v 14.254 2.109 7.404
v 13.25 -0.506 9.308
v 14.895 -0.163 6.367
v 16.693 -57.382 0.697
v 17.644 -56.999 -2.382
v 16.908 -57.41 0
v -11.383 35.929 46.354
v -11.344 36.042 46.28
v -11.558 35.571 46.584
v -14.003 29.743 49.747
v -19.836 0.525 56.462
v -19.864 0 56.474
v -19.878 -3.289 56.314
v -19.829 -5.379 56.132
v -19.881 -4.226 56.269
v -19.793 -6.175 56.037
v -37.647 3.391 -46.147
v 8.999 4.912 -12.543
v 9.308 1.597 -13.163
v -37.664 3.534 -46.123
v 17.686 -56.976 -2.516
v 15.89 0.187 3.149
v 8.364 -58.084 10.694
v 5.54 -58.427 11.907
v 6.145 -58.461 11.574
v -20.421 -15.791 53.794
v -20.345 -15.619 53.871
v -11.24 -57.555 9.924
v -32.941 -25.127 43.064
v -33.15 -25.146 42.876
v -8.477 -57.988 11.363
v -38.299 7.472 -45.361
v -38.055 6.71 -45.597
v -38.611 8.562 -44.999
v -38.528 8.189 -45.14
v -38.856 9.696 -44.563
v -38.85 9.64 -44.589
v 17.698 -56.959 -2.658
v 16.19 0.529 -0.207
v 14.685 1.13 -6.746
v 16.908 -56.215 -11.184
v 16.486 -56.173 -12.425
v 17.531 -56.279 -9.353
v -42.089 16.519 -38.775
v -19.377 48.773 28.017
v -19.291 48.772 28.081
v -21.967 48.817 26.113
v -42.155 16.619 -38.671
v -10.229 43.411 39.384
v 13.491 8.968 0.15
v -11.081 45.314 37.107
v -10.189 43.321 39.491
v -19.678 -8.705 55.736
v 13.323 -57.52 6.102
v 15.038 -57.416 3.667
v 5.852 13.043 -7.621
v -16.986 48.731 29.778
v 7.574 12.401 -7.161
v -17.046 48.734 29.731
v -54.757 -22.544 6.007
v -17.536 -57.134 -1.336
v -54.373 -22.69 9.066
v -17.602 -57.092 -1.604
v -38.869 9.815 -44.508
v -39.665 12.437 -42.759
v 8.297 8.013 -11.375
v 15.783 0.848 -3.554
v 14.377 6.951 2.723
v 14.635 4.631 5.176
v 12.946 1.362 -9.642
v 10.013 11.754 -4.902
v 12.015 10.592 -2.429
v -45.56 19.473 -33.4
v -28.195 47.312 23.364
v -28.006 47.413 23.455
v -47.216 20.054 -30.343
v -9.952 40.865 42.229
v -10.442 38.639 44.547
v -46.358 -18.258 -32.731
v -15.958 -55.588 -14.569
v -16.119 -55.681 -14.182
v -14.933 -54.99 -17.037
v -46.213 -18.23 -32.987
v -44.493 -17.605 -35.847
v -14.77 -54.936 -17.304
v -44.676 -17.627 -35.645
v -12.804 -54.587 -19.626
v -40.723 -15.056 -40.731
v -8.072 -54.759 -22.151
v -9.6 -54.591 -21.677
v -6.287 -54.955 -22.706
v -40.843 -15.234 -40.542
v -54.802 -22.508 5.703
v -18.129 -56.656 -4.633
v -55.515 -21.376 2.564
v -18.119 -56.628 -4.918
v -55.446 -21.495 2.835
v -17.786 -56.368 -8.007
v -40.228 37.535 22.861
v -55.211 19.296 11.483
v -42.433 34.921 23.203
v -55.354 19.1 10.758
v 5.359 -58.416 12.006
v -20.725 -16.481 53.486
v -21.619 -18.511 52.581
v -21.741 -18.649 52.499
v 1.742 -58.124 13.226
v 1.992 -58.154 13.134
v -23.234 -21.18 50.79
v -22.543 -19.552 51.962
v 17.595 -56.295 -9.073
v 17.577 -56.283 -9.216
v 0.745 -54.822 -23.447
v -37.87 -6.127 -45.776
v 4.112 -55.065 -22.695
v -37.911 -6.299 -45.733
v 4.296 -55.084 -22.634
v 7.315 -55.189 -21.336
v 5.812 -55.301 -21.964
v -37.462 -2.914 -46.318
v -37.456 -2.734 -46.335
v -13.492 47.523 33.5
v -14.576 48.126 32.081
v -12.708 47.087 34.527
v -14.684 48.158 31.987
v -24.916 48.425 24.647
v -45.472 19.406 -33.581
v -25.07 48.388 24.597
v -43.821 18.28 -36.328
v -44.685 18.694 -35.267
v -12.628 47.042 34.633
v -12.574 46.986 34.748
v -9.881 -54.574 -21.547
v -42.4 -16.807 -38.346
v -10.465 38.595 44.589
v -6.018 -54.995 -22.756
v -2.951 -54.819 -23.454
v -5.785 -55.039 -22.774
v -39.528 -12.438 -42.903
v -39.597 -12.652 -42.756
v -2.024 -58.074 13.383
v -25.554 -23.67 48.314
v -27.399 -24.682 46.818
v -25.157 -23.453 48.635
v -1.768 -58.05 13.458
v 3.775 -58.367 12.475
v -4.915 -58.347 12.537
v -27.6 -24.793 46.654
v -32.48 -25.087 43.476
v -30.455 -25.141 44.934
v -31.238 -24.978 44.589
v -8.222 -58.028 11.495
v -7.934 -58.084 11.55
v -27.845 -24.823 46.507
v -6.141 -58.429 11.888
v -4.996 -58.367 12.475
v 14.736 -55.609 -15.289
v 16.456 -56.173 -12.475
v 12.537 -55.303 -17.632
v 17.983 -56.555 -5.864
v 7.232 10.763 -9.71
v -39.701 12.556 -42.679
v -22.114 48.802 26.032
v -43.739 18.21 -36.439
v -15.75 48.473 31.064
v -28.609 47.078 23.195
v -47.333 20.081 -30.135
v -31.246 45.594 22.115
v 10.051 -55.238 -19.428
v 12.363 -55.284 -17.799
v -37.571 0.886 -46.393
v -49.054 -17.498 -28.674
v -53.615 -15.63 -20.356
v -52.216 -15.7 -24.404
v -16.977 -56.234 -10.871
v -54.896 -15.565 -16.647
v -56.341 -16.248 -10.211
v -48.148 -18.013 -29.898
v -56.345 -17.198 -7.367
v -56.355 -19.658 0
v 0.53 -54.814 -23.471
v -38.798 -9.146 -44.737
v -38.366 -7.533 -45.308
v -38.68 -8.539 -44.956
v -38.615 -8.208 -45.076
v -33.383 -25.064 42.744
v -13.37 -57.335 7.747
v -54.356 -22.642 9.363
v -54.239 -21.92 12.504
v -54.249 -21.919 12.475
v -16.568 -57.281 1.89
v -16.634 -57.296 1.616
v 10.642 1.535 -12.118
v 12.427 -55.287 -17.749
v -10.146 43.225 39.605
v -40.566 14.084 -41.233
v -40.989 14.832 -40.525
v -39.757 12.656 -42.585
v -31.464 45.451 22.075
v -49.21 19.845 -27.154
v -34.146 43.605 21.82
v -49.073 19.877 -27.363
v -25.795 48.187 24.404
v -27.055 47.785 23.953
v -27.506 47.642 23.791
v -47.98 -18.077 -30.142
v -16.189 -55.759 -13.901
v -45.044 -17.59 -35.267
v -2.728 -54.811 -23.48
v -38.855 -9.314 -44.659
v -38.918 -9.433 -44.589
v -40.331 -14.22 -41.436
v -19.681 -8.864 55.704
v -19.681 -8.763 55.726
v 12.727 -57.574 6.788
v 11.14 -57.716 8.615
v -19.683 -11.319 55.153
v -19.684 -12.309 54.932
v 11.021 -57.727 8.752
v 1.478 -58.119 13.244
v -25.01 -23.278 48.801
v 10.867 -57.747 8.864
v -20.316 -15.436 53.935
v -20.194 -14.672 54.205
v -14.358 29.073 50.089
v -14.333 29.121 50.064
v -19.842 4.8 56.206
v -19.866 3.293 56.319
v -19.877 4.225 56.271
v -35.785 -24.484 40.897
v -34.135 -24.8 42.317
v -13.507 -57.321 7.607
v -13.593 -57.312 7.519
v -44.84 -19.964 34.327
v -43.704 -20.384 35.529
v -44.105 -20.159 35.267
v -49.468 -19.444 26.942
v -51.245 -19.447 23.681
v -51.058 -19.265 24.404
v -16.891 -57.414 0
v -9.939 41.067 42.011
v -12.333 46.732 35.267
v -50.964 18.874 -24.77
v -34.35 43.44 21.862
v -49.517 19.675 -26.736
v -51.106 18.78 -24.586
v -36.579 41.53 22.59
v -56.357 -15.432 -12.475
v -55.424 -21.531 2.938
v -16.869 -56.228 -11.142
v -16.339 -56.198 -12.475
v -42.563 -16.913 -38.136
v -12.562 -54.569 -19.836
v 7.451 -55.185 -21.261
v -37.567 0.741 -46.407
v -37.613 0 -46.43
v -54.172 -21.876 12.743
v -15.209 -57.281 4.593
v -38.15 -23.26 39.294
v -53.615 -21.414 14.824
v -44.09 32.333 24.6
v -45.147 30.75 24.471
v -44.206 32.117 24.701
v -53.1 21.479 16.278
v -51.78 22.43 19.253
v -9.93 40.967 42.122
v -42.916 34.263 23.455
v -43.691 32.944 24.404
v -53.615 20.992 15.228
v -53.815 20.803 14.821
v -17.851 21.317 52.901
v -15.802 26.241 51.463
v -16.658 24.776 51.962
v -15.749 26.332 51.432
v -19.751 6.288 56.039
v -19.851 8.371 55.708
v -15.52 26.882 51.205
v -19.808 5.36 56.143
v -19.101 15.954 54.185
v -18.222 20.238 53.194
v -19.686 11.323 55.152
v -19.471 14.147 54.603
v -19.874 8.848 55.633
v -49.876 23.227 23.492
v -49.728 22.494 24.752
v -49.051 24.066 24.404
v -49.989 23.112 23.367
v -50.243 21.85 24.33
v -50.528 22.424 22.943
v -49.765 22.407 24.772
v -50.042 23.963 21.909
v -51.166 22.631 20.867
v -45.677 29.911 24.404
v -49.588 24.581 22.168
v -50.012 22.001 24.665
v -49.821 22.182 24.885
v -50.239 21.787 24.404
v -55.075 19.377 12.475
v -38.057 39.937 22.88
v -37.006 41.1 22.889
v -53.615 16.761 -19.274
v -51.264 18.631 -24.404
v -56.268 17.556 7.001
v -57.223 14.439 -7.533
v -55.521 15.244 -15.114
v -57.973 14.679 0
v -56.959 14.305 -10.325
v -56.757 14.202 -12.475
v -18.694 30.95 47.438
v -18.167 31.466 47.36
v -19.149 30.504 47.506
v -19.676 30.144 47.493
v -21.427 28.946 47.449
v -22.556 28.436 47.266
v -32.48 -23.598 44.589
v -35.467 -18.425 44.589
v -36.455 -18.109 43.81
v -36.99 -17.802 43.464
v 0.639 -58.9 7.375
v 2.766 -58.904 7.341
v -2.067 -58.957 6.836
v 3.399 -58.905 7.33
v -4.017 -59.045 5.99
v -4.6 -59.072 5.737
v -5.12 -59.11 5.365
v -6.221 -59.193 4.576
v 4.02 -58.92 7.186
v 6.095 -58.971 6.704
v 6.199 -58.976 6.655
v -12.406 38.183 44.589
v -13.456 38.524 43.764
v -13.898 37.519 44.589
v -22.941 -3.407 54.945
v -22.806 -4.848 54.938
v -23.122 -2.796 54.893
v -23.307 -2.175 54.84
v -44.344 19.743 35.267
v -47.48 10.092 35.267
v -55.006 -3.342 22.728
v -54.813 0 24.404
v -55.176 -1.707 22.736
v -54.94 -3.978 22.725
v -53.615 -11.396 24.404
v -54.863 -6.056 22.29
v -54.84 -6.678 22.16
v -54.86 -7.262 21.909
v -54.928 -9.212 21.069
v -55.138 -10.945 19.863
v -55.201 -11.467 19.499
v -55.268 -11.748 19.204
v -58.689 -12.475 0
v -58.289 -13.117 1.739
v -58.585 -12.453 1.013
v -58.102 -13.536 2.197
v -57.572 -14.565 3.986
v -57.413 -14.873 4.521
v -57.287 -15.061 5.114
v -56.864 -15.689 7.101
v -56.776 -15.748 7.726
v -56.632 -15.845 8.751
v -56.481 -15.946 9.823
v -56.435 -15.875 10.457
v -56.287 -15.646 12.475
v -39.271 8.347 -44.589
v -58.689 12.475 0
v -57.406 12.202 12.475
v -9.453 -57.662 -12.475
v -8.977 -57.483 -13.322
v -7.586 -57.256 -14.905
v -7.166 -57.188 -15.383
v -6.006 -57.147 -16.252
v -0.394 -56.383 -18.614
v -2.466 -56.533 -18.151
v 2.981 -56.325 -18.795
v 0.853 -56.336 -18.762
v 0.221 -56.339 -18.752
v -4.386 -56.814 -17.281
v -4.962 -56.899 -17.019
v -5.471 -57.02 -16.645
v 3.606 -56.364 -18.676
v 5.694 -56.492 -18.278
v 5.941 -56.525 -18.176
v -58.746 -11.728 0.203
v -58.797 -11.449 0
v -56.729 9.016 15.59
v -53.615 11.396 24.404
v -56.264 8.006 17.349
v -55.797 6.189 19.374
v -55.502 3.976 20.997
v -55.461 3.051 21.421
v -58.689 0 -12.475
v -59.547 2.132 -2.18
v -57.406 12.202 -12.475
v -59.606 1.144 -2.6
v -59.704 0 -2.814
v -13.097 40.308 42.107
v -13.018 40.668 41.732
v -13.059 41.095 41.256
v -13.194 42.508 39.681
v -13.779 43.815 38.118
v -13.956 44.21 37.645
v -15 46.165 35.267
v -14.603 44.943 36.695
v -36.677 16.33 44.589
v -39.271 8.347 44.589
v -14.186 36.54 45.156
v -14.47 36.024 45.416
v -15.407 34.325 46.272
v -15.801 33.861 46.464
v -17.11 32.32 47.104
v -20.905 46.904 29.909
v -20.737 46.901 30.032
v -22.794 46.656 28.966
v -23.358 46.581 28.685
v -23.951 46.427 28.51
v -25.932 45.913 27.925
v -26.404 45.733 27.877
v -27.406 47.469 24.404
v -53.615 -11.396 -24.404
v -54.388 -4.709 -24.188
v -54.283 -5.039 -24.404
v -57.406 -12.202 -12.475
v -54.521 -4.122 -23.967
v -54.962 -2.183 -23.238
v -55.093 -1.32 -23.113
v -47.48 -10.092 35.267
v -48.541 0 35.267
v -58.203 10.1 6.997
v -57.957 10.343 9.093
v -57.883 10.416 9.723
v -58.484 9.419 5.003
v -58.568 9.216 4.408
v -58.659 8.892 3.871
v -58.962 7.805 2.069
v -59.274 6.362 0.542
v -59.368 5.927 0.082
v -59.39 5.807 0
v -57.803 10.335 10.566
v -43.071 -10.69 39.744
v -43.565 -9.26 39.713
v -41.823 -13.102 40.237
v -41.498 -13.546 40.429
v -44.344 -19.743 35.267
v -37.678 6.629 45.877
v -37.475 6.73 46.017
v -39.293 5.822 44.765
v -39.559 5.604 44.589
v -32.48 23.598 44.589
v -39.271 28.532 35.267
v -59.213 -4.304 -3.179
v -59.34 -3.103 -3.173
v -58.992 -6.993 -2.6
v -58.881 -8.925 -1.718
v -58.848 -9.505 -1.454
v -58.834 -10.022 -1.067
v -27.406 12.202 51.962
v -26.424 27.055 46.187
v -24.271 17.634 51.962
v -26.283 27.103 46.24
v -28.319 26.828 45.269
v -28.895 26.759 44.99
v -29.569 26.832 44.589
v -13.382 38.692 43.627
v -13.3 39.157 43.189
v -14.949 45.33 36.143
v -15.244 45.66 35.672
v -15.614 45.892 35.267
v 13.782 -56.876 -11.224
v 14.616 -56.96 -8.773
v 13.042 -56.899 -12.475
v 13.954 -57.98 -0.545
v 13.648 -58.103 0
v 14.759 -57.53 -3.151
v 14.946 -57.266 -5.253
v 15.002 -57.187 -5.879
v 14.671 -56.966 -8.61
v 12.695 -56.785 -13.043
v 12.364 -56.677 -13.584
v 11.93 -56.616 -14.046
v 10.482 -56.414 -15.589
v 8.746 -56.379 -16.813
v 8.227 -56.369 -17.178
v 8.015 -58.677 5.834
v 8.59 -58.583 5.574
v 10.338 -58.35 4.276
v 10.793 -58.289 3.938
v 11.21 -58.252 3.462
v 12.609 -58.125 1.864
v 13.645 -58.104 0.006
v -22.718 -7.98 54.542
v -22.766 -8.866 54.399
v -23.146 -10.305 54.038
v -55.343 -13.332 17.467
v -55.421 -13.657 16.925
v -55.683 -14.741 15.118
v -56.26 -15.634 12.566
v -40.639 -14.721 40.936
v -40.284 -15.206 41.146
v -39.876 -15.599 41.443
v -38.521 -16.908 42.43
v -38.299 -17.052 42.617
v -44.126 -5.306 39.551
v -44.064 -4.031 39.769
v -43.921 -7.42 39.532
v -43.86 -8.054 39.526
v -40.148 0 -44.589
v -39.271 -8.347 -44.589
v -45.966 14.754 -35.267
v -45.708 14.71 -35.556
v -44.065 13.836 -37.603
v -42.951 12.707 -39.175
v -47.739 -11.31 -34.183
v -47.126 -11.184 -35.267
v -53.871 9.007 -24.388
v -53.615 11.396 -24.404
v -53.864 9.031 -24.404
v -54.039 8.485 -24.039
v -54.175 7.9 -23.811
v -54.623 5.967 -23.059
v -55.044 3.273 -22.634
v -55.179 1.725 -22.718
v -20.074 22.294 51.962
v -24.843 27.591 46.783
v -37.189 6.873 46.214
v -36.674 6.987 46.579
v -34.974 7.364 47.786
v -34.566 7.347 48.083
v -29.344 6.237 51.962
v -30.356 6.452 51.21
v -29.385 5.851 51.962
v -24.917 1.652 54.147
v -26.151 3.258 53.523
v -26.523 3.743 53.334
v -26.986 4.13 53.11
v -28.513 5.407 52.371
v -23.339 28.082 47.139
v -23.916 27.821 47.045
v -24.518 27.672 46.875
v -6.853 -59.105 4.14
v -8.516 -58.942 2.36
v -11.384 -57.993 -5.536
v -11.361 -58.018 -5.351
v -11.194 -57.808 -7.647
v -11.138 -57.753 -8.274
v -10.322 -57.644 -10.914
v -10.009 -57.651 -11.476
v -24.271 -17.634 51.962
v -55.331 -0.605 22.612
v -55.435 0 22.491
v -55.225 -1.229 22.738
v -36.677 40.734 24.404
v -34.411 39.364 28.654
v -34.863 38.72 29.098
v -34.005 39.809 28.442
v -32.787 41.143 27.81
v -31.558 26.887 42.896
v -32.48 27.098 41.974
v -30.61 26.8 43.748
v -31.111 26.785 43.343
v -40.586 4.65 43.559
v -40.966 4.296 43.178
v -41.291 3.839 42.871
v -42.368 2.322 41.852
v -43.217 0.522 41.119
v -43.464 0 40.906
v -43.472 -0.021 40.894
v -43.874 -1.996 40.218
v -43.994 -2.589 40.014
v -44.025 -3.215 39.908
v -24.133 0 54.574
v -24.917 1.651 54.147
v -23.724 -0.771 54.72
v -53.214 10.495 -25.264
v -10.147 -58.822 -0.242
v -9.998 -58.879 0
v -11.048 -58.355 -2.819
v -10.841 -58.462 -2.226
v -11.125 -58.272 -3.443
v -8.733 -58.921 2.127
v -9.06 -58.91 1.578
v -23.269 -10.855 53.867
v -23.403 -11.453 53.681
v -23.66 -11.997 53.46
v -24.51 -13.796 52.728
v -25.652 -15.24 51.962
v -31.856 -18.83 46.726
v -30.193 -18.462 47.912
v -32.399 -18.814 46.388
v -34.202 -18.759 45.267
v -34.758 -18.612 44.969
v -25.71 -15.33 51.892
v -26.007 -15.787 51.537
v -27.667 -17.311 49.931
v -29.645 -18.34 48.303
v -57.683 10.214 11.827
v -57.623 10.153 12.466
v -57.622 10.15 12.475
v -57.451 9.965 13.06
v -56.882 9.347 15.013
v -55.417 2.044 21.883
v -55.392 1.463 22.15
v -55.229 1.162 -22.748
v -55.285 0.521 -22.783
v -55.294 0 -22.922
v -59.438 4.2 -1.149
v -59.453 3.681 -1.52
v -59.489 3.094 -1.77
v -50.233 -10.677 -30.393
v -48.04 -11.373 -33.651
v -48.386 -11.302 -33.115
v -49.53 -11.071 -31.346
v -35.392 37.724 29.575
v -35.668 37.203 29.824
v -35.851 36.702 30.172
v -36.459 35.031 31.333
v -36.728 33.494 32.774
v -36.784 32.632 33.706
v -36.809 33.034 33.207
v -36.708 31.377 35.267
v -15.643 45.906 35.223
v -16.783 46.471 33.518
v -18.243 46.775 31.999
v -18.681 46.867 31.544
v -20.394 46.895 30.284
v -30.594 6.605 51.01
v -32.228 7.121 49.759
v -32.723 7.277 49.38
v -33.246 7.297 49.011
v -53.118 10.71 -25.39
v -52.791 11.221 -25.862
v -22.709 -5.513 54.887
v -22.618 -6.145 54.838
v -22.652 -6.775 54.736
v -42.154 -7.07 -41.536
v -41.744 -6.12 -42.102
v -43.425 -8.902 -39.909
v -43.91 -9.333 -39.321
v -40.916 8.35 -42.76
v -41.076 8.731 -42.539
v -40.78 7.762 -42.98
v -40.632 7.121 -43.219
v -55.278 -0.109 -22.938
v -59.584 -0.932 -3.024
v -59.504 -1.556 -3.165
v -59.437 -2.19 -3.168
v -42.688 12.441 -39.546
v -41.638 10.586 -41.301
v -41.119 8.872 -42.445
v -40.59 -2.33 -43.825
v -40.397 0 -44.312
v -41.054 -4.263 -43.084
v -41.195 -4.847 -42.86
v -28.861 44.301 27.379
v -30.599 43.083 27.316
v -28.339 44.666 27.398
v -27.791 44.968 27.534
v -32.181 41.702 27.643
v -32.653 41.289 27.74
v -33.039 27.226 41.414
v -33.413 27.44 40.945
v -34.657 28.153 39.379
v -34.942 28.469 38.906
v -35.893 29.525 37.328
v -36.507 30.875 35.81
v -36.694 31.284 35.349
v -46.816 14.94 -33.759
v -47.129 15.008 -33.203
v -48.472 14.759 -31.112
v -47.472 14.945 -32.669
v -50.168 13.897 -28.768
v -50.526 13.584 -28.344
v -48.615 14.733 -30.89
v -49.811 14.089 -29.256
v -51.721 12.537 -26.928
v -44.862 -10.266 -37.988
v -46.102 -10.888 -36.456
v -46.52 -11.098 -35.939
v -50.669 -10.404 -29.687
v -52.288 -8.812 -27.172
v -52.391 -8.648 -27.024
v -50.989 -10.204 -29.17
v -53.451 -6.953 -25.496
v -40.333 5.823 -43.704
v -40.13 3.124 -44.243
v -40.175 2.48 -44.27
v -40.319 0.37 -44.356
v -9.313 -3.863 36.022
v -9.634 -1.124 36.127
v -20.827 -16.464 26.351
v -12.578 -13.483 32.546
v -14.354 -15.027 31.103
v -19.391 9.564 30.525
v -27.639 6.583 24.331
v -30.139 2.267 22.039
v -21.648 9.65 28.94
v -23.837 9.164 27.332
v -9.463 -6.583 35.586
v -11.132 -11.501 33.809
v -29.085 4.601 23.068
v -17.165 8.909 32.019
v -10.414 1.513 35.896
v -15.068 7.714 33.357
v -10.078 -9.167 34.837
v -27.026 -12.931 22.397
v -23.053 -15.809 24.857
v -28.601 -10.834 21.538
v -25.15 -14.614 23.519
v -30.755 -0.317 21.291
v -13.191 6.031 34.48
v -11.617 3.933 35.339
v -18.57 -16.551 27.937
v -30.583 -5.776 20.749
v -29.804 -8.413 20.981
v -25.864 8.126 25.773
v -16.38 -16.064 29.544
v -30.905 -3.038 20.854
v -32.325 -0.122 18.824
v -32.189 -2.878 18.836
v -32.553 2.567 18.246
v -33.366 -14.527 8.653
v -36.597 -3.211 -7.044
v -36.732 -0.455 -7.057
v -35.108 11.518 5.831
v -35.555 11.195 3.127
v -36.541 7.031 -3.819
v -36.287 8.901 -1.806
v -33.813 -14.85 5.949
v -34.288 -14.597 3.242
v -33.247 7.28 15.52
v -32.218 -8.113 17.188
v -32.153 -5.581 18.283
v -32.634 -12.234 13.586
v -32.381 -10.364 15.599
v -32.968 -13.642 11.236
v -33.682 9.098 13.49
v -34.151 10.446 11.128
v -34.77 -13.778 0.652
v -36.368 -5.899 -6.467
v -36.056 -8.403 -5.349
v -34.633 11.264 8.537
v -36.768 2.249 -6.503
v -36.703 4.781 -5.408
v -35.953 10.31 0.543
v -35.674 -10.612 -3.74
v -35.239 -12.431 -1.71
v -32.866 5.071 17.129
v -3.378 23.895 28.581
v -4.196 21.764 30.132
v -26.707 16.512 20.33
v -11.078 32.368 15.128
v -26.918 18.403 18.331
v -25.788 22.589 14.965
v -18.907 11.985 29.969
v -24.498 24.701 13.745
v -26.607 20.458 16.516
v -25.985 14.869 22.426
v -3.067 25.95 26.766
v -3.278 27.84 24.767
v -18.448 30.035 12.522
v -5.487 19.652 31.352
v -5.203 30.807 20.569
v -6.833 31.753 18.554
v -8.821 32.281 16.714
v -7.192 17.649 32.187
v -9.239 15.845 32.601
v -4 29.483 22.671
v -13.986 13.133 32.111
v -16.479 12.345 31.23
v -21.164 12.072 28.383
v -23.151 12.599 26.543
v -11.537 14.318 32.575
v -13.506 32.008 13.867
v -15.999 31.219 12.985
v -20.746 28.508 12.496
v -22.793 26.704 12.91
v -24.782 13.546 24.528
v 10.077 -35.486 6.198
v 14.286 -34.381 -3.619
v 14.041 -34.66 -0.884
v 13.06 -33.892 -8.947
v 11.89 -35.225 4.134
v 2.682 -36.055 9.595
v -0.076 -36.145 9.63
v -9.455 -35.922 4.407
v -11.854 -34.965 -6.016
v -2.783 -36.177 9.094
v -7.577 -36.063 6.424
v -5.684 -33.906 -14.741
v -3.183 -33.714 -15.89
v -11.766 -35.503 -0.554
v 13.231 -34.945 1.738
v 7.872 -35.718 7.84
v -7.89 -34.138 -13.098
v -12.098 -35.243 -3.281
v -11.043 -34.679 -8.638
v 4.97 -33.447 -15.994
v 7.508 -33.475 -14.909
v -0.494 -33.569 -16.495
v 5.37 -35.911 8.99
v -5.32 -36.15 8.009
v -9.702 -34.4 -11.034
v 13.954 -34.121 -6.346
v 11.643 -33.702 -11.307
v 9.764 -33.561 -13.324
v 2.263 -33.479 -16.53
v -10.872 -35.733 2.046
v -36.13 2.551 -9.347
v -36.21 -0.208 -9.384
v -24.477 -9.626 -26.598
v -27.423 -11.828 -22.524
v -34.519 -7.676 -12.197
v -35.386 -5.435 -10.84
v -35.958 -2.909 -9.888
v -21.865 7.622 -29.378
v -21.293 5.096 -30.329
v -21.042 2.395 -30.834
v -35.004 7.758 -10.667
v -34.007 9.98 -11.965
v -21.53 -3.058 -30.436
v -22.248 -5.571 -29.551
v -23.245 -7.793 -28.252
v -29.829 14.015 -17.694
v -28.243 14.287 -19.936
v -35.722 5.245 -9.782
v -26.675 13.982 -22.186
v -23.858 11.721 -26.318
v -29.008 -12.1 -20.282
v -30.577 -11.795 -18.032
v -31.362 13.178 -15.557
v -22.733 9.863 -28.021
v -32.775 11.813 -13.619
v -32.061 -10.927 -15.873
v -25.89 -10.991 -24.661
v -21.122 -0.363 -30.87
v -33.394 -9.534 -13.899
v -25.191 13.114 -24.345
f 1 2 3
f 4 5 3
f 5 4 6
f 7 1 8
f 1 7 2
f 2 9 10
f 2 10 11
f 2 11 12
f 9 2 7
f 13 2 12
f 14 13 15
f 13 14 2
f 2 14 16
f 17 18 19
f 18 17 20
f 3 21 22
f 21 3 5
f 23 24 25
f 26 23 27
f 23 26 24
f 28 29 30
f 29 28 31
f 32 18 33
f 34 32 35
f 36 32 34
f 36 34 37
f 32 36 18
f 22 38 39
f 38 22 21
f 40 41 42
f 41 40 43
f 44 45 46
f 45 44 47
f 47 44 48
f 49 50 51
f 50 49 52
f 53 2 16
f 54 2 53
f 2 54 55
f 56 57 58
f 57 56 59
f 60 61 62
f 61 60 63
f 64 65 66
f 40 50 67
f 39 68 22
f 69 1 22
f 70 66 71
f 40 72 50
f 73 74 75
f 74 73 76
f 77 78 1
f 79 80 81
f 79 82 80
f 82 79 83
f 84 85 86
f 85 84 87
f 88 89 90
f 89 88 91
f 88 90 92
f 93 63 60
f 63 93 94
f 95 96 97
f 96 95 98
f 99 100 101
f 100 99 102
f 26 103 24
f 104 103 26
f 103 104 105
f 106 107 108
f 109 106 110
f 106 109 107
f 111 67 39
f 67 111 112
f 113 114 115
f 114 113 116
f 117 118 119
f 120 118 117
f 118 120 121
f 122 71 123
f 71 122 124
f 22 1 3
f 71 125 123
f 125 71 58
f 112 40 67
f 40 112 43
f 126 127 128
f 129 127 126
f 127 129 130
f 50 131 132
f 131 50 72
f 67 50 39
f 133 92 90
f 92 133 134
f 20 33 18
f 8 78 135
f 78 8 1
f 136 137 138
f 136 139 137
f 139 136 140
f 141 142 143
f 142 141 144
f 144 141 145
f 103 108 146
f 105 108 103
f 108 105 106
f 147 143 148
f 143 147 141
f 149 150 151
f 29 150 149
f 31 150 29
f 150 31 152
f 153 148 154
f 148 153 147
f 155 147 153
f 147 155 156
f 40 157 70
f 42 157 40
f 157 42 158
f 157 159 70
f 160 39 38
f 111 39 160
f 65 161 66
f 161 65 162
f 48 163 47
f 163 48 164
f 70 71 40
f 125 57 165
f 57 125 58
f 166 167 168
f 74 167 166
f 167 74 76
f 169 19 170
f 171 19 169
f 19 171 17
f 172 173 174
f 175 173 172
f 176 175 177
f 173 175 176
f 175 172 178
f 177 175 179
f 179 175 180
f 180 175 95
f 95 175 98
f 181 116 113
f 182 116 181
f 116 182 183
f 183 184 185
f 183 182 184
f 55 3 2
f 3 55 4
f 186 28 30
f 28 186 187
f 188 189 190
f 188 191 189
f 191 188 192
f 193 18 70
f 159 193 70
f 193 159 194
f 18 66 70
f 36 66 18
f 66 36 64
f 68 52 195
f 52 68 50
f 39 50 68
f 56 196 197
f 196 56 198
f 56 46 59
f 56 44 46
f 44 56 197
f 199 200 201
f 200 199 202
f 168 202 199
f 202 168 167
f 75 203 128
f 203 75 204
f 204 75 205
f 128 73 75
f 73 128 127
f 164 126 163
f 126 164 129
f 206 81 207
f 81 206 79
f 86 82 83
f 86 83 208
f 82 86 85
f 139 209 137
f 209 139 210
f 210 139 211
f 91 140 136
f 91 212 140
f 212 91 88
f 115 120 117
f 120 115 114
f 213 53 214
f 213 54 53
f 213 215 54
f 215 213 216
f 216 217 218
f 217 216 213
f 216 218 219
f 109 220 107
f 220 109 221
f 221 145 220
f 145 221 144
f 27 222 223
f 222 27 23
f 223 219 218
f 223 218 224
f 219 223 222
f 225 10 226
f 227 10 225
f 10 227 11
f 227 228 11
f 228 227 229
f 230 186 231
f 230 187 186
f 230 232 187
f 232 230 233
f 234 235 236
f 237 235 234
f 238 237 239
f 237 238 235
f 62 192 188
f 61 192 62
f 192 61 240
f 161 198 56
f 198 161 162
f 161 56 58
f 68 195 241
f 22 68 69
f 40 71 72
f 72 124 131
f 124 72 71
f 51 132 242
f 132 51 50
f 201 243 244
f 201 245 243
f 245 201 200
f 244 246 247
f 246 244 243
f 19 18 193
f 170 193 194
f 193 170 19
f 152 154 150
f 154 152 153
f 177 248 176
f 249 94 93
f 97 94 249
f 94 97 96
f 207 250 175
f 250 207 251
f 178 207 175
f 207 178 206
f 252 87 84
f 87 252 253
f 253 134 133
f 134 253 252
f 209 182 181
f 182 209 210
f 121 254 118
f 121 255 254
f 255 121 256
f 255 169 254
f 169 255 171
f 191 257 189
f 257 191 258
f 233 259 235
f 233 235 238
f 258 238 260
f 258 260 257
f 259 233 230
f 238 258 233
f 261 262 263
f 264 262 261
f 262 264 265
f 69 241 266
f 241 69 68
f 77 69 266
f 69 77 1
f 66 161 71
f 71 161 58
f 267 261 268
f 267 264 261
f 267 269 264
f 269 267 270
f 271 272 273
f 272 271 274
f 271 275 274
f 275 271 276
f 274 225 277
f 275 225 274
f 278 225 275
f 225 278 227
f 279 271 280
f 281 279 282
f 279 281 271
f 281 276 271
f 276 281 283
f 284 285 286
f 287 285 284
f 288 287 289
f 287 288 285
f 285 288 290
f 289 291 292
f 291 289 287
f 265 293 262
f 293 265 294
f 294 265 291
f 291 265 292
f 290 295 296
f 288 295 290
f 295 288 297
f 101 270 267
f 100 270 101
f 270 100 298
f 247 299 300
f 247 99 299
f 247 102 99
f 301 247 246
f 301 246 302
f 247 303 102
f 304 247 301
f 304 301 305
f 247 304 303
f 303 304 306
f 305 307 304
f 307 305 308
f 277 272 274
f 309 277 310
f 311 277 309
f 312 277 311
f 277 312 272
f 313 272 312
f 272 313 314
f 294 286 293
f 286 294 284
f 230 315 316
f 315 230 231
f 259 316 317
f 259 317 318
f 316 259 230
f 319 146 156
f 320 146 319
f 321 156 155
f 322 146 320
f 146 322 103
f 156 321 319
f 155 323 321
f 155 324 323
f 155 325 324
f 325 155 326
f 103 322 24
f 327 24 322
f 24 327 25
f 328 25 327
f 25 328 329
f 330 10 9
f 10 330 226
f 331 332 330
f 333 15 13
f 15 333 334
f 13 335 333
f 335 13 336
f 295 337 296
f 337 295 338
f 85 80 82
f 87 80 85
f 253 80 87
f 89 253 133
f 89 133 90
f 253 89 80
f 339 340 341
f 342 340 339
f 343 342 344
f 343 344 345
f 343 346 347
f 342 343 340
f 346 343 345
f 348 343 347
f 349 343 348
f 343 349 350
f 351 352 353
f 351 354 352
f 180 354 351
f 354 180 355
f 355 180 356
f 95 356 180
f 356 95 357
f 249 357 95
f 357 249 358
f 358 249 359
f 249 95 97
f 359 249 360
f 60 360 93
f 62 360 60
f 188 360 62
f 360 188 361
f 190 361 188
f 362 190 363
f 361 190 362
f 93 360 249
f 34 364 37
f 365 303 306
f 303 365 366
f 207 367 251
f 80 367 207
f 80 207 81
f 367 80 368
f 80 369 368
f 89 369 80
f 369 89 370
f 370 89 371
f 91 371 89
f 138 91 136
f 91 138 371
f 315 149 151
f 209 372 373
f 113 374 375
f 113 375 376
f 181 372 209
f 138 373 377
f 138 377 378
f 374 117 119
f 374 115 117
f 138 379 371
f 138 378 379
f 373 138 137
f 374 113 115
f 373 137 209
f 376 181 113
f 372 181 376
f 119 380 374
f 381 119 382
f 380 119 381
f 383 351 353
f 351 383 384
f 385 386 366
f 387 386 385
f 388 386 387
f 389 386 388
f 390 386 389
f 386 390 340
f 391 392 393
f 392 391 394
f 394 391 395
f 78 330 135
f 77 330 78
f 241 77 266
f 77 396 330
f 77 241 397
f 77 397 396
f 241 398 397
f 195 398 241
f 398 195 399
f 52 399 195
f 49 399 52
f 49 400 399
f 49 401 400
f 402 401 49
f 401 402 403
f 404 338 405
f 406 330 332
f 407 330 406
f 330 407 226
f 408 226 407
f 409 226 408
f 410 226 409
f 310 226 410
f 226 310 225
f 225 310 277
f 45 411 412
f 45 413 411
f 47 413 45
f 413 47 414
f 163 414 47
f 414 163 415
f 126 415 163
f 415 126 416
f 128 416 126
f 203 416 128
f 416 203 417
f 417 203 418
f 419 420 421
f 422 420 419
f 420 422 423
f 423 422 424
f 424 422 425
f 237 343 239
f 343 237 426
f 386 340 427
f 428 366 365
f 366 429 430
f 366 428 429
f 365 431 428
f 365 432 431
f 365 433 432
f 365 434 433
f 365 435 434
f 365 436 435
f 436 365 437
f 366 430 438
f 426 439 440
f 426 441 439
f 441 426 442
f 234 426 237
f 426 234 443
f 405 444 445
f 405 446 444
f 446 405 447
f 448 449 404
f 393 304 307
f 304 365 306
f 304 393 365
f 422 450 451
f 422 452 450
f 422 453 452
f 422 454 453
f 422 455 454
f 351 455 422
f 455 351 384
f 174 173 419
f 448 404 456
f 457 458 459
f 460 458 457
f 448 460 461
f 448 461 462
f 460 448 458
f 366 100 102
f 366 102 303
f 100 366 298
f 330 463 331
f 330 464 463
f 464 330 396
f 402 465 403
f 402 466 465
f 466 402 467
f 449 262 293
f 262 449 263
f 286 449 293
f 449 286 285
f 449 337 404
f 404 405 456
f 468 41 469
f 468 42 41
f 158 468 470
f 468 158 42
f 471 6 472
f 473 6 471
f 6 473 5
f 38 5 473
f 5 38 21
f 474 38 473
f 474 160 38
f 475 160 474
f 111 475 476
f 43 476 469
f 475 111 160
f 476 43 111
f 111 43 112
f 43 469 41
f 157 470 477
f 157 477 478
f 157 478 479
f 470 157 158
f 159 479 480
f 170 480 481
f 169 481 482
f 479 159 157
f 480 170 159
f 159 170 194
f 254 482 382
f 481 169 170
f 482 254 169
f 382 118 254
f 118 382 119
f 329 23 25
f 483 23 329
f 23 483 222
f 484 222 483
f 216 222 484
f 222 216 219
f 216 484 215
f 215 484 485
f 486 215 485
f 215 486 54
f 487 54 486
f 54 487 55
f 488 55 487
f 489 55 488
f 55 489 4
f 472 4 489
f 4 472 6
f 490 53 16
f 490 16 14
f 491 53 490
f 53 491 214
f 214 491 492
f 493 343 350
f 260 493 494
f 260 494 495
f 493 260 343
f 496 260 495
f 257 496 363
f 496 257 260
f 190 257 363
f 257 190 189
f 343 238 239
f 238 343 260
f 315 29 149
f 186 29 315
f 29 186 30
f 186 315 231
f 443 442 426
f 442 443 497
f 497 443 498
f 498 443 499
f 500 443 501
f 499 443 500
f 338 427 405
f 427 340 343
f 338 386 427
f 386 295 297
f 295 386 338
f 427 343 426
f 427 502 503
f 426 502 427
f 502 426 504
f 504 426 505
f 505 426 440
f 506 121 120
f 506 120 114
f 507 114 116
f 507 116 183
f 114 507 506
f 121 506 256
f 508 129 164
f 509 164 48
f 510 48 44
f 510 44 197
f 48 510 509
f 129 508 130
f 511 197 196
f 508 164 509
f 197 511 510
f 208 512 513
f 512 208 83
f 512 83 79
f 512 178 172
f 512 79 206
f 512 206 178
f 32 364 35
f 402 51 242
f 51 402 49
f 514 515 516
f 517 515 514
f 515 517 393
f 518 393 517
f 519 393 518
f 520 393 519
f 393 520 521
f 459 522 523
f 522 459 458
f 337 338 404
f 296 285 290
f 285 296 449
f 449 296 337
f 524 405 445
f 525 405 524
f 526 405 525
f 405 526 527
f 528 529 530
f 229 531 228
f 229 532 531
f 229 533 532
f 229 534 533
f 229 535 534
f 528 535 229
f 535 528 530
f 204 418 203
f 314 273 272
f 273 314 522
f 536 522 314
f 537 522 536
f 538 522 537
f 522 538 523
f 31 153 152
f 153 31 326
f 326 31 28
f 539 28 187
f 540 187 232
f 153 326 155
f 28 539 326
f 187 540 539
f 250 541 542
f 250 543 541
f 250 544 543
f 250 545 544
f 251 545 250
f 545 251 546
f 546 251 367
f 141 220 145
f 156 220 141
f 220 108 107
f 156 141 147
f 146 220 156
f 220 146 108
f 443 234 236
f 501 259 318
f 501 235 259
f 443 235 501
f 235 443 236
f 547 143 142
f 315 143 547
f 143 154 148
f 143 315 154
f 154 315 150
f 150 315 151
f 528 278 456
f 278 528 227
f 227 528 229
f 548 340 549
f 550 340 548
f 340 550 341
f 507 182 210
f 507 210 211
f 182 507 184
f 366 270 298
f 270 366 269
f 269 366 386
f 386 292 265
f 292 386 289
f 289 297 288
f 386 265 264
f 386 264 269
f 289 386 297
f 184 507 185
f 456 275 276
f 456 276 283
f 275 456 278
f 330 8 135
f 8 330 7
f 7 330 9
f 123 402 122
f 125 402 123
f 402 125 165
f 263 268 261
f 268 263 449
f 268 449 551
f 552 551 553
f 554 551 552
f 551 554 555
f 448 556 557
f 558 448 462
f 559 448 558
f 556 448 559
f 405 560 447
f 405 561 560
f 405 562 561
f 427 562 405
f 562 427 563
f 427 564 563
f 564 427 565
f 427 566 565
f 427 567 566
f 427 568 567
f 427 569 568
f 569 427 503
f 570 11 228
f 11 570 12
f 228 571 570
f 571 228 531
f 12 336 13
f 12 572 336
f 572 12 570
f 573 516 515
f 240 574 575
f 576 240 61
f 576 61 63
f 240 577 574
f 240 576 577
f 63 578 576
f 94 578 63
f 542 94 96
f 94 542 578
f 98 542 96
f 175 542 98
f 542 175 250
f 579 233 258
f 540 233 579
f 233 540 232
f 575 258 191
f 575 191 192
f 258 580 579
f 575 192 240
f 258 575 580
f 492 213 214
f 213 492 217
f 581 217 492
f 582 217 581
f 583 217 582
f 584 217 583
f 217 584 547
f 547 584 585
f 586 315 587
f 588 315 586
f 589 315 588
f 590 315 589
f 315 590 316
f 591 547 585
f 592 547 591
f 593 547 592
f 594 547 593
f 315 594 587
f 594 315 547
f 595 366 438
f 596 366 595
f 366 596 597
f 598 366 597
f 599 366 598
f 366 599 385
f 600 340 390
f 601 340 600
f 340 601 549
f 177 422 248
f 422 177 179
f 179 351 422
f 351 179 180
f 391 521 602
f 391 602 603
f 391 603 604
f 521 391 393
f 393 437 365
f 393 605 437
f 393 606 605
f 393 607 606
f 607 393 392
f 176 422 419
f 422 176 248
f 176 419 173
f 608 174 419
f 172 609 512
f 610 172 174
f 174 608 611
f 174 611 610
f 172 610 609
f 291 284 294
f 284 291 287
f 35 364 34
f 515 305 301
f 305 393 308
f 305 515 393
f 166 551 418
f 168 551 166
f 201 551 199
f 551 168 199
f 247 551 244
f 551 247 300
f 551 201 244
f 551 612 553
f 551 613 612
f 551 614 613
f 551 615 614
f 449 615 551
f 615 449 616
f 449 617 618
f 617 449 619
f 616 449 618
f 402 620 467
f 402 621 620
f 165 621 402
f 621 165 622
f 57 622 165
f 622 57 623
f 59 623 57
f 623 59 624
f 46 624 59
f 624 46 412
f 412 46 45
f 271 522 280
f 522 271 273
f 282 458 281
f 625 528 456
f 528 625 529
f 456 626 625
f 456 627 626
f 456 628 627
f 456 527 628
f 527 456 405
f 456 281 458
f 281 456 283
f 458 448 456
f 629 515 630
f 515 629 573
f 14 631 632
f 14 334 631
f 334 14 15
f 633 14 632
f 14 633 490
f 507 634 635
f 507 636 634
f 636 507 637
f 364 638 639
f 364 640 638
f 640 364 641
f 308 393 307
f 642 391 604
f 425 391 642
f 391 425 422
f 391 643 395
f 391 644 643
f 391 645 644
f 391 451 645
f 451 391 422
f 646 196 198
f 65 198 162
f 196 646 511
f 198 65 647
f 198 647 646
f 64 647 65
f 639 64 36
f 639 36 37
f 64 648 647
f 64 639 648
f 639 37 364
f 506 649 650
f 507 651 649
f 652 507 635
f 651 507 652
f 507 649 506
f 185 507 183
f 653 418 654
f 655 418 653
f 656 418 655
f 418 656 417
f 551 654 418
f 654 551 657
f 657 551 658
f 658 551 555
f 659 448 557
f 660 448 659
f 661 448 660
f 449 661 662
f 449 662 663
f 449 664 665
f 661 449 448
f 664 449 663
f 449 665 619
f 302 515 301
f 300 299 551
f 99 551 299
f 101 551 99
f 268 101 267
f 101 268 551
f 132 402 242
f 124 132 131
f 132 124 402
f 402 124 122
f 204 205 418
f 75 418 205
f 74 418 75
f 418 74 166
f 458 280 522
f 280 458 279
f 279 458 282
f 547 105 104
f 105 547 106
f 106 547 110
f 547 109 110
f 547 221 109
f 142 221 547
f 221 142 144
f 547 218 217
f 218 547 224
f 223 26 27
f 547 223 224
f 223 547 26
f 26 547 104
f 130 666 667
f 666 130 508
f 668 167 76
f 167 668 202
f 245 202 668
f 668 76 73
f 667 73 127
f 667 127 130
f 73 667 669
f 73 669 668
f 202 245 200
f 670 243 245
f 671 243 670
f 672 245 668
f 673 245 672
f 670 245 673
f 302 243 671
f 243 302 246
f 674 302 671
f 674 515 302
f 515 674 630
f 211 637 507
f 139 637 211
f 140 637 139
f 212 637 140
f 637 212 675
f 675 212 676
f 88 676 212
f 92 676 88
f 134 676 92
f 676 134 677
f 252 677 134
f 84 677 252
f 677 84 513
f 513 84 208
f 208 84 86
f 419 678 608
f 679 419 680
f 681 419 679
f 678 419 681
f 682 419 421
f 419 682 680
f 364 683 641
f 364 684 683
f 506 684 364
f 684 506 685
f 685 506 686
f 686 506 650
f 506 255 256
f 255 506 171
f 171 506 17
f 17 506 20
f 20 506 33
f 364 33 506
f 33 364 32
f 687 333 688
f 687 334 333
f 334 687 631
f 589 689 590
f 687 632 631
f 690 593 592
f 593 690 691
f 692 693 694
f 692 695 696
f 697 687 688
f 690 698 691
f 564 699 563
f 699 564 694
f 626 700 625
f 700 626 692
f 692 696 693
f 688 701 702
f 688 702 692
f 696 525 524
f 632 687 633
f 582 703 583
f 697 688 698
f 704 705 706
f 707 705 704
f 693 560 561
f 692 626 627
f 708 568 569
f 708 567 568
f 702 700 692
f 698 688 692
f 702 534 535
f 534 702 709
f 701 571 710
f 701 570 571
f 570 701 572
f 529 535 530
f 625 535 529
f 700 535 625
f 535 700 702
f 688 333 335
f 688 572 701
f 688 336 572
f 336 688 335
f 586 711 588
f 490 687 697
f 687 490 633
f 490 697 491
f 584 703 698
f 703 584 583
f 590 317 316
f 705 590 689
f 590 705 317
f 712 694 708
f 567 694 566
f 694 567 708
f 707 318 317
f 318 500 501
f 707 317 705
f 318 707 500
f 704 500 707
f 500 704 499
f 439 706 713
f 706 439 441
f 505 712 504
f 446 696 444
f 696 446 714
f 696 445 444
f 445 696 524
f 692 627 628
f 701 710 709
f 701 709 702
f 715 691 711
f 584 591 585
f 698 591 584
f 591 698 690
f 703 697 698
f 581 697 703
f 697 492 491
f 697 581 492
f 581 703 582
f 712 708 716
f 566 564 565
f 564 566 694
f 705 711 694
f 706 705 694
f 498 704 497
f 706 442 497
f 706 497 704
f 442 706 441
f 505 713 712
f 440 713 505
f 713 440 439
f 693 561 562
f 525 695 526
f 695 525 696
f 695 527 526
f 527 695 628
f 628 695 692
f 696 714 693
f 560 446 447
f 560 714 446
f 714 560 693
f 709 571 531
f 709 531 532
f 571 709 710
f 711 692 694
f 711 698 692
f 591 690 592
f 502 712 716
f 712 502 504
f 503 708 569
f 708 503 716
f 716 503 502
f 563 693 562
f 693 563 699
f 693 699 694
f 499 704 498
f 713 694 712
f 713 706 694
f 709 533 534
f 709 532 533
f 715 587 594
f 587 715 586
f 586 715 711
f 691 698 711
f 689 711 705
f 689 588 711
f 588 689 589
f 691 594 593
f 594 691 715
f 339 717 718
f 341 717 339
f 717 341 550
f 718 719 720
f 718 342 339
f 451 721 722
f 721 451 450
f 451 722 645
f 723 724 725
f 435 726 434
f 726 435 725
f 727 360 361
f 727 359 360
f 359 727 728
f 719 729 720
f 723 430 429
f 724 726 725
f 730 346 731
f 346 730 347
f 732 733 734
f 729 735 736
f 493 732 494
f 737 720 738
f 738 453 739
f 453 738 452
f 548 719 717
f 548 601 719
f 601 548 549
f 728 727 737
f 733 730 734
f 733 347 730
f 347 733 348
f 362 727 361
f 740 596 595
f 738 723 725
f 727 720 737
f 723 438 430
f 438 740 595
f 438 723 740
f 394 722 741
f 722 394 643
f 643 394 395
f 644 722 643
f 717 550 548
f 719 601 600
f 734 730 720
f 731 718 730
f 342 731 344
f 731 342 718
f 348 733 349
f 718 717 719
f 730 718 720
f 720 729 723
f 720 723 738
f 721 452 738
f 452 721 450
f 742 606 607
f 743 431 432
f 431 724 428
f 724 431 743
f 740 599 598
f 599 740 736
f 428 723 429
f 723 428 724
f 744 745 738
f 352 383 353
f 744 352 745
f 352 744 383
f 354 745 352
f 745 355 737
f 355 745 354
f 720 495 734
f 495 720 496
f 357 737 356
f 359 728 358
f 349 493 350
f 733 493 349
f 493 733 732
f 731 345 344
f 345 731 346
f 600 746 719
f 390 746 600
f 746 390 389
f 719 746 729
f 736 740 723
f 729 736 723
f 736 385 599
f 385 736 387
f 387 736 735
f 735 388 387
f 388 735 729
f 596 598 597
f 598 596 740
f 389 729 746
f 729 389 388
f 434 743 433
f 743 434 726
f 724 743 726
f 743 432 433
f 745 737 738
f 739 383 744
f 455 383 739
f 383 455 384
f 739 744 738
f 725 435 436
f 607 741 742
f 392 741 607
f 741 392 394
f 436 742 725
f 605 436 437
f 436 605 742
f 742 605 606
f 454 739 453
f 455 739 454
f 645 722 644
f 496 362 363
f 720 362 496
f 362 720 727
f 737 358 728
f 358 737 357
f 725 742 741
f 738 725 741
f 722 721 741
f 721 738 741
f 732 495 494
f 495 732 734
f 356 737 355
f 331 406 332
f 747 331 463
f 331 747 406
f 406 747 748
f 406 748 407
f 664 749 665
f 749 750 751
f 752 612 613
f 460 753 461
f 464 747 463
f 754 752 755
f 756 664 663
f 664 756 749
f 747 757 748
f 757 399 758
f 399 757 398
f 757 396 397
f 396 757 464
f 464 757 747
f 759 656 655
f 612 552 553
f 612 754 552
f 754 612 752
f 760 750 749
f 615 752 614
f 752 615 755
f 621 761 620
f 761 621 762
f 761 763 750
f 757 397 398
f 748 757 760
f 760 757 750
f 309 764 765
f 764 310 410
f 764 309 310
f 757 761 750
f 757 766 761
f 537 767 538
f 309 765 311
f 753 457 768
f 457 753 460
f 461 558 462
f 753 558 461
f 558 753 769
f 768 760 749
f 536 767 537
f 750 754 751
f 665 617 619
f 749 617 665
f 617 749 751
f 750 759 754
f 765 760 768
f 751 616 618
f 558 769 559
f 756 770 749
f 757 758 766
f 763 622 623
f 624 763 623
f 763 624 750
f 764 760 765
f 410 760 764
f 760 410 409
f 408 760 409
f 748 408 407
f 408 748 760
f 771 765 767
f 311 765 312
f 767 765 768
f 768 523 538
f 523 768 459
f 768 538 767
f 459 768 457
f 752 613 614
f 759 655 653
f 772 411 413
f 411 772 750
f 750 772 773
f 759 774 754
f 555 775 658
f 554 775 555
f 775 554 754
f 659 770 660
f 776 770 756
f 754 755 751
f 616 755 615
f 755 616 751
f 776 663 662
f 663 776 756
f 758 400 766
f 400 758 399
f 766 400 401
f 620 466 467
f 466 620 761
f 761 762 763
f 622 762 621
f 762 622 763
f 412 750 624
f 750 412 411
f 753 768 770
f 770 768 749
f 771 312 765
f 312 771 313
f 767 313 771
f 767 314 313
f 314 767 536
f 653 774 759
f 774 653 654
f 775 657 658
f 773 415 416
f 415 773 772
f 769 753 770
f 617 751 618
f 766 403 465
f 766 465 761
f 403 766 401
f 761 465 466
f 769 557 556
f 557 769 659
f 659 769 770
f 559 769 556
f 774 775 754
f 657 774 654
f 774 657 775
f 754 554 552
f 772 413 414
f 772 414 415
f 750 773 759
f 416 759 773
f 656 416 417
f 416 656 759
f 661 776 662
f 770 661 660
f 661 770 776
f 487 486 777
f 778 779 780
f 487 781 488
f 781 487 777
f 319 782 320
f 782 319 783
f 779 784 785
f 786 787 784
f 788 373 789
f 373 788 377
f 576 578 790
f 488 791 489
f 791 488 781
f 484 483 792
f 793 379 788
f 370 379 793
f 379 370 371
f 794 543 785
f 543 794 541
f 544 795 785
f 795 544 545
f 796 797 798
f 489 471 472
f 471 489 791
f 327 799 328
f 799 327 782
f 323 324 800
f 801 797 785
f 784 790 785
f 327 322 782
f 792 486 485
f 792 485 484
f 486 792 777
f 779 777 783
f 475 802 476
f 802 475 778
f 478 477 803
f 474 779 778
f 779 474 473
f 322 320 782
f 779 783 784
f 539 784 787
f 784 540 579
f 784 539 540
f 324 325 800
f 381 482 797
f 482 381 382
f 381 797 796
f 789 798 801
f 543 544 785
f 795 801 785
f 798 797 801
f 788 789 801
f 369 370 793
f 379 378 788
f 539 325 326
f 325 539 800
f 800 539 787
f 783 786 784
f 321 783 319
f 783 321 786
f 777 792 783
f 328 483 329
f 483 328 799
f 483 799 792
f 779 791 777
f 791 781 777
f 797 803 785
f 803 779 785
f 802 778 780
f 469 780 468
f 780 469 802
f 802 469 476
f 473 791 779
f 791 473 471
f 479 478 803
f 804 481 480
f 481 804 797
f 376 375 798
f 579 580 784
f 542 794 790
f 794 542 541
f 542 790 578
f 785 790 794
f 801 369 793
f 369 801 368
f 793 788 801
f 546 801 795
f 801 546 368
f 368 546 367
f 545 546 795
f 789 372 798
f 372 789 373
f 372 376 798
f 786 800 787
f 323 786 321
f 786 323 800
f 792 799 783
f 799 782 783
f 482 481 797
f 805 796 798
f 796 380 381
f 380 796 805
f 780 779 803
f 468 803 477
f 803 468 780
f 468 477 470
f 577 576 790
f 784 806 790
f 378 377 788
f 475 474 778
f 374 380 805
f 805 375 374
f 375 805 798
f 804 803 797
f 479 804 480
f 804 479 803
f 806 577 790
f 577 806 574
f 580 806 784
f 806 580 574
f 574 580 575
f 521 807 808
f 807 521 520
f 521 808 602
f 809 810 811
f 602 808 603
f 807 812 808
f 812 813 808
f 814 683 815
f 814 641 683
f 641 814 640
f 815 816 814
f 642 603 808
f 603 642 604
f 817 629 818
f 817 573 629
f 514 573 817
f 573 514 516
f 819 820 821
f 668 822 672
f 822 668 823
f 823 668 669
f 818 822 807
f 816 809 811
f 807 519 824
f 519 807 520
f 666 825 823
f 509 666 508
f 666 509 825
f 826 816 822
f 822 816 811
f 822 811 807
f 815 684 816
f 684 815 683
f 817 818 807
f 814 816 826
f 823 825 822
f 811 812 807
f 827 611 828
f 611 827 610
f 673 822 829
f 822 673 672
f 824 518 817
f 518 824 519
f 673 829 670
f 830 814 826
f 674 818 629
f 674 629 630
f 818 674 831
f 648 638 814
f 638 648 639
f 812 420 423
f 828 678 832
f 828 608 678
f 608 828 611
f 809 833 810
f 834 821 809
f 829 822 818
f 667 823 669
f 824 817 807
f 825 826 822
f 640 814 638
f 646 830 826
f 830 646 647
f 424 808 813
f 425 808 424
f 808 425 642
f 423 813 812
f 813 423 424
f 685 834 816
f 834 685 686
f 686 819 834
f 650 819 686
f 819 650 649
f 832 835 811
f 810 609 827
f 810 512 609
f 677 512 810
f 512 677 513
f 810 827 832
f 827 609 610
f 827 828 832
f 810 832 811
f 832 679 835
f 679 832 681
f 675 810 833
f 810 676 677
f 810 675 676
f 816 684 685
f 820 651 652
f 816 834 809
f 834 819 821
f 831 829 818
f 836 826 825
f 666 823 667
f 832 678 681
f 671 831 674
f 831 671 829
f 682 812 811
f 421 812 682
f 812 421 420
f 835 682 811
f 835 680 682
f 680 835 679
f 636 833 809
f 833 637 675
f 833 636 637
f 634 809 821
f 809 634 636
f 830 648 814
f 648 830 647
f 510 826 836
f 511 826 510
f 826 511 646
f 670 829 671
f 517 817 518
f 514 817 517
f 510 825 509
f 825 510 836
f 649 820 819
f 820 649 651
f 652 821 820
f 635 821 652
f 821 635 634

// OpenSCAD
union() {
	difference() {
		intersection() {
			hull() {
				rotate(a = -35.6571298247, v = [-0.0985751959, 0.5745383453, 0.0000000000]) {
					rotate(a = -0.0000000000, v = [0.0000000000, 0.0000000000, 0.0000000000]) {
						cylinder(h = 60, r = 16.2000000000);
					}
				}
				rotate(a = -35.6571298247, v = [-0.0985751959, 0.5745383453, 0.0000000000]) {
					rotate(a = -45.0000000000, v = [0.0000000000, 0.7071067812, 0.0000000000]) {
						cylinder(h = 60, r = 16.2000000000);
					}
				}
				rotate(a = -35.6571298247, v = [-0.0985751959, 0.5745383453, 0.0000000000]) {
					rotate(a = -45.0000000000, v = [0.7071067812, 0.0000000000, -0.0000000000]) {
						cylinder(h = 60, r = 16.2000000000);
					}
				}
				rotate(a = -35.6571298247, v = [-0.0985751959, 0.5745383453, 0.0000000000]) {
					rotate(a = -90.0000000000, v = [-1.0000000000, 0.0000000000, 0.0000000000]) {
						cylinder(h = 60, r = 16.2000000000);
					}
				}
				rotate(a = -35.6571298247, v = [-0.0985751959, 0.5745383453, 0.0000000000]) {
					rotate(a = -90.0000000000, v = [0.0000000000, 1.0000000000, 0.0000000000]) {
						cylinder(h = 60, r = 16.2000000000);
					}
				}
			}
			sphere(r = 60);
		}
		union() {
			rotate(a = -35.6571298247, v = [-0.0985751959, 0.5745383453, 0.0000000000]) {
				rotate(a = -0.0000000000, v = [0.0000000000, 0.0000000000, 0.0000000000]) {
					translate(v = [0, 0, 35]) {
						cylinder(h = 100, r = 13.2000000000);
					}
				}
			}
			rotate(a = -35.6571298247, v = [-0.0985751959, 0.5745383453, 0.0000000000]) {
				rotate(a = -45.0000000000, v = [0.0000000000, 0.7071067812, 0.0000000000]) {
					translate(v = [0, 0, 35]) {
						cylinder(h = 100, r = 13.2000000000);
					}
				}
			}
			rotate(a = -35.6571298247, v = [-0.0985751959, 0.5745383453, 0.0000000000]) {
				rotate(a = -45.0000000000, v = [0.7071067812, 0.0000000000, -0.0000000000]) {
					translate(v = [0, 0, 35]) {
						cylinder(h = 100, r = 13.2000000000);
					}
				}
			}
			rotate(a = -35.6571298247, v = [-0.0985751959, 0.5745383453, 0.0000000000]) {
				rotate(a = -90.0000000000, v = [-1.0000000000, 0.0000000000, 0.0000000000]) {
					translate(v = [0, 0, 35]) {
						cylinder(h = 100, r = 13.2000000000);
					}
				}
			}
			rotate(a = -35.6571298247, v = [-0.0985751959, 0.5745383453, 0.0000000000]) {
				rotate(a = -90.0000000000, v = [0.0000000000, 1.0000000000, 0.0000000000]) {
					translate(v = [0, 0, 35]) {
						cylinder(h = 100, r = 13.2000000000);
					}
				}
			}
		}
	}
}
